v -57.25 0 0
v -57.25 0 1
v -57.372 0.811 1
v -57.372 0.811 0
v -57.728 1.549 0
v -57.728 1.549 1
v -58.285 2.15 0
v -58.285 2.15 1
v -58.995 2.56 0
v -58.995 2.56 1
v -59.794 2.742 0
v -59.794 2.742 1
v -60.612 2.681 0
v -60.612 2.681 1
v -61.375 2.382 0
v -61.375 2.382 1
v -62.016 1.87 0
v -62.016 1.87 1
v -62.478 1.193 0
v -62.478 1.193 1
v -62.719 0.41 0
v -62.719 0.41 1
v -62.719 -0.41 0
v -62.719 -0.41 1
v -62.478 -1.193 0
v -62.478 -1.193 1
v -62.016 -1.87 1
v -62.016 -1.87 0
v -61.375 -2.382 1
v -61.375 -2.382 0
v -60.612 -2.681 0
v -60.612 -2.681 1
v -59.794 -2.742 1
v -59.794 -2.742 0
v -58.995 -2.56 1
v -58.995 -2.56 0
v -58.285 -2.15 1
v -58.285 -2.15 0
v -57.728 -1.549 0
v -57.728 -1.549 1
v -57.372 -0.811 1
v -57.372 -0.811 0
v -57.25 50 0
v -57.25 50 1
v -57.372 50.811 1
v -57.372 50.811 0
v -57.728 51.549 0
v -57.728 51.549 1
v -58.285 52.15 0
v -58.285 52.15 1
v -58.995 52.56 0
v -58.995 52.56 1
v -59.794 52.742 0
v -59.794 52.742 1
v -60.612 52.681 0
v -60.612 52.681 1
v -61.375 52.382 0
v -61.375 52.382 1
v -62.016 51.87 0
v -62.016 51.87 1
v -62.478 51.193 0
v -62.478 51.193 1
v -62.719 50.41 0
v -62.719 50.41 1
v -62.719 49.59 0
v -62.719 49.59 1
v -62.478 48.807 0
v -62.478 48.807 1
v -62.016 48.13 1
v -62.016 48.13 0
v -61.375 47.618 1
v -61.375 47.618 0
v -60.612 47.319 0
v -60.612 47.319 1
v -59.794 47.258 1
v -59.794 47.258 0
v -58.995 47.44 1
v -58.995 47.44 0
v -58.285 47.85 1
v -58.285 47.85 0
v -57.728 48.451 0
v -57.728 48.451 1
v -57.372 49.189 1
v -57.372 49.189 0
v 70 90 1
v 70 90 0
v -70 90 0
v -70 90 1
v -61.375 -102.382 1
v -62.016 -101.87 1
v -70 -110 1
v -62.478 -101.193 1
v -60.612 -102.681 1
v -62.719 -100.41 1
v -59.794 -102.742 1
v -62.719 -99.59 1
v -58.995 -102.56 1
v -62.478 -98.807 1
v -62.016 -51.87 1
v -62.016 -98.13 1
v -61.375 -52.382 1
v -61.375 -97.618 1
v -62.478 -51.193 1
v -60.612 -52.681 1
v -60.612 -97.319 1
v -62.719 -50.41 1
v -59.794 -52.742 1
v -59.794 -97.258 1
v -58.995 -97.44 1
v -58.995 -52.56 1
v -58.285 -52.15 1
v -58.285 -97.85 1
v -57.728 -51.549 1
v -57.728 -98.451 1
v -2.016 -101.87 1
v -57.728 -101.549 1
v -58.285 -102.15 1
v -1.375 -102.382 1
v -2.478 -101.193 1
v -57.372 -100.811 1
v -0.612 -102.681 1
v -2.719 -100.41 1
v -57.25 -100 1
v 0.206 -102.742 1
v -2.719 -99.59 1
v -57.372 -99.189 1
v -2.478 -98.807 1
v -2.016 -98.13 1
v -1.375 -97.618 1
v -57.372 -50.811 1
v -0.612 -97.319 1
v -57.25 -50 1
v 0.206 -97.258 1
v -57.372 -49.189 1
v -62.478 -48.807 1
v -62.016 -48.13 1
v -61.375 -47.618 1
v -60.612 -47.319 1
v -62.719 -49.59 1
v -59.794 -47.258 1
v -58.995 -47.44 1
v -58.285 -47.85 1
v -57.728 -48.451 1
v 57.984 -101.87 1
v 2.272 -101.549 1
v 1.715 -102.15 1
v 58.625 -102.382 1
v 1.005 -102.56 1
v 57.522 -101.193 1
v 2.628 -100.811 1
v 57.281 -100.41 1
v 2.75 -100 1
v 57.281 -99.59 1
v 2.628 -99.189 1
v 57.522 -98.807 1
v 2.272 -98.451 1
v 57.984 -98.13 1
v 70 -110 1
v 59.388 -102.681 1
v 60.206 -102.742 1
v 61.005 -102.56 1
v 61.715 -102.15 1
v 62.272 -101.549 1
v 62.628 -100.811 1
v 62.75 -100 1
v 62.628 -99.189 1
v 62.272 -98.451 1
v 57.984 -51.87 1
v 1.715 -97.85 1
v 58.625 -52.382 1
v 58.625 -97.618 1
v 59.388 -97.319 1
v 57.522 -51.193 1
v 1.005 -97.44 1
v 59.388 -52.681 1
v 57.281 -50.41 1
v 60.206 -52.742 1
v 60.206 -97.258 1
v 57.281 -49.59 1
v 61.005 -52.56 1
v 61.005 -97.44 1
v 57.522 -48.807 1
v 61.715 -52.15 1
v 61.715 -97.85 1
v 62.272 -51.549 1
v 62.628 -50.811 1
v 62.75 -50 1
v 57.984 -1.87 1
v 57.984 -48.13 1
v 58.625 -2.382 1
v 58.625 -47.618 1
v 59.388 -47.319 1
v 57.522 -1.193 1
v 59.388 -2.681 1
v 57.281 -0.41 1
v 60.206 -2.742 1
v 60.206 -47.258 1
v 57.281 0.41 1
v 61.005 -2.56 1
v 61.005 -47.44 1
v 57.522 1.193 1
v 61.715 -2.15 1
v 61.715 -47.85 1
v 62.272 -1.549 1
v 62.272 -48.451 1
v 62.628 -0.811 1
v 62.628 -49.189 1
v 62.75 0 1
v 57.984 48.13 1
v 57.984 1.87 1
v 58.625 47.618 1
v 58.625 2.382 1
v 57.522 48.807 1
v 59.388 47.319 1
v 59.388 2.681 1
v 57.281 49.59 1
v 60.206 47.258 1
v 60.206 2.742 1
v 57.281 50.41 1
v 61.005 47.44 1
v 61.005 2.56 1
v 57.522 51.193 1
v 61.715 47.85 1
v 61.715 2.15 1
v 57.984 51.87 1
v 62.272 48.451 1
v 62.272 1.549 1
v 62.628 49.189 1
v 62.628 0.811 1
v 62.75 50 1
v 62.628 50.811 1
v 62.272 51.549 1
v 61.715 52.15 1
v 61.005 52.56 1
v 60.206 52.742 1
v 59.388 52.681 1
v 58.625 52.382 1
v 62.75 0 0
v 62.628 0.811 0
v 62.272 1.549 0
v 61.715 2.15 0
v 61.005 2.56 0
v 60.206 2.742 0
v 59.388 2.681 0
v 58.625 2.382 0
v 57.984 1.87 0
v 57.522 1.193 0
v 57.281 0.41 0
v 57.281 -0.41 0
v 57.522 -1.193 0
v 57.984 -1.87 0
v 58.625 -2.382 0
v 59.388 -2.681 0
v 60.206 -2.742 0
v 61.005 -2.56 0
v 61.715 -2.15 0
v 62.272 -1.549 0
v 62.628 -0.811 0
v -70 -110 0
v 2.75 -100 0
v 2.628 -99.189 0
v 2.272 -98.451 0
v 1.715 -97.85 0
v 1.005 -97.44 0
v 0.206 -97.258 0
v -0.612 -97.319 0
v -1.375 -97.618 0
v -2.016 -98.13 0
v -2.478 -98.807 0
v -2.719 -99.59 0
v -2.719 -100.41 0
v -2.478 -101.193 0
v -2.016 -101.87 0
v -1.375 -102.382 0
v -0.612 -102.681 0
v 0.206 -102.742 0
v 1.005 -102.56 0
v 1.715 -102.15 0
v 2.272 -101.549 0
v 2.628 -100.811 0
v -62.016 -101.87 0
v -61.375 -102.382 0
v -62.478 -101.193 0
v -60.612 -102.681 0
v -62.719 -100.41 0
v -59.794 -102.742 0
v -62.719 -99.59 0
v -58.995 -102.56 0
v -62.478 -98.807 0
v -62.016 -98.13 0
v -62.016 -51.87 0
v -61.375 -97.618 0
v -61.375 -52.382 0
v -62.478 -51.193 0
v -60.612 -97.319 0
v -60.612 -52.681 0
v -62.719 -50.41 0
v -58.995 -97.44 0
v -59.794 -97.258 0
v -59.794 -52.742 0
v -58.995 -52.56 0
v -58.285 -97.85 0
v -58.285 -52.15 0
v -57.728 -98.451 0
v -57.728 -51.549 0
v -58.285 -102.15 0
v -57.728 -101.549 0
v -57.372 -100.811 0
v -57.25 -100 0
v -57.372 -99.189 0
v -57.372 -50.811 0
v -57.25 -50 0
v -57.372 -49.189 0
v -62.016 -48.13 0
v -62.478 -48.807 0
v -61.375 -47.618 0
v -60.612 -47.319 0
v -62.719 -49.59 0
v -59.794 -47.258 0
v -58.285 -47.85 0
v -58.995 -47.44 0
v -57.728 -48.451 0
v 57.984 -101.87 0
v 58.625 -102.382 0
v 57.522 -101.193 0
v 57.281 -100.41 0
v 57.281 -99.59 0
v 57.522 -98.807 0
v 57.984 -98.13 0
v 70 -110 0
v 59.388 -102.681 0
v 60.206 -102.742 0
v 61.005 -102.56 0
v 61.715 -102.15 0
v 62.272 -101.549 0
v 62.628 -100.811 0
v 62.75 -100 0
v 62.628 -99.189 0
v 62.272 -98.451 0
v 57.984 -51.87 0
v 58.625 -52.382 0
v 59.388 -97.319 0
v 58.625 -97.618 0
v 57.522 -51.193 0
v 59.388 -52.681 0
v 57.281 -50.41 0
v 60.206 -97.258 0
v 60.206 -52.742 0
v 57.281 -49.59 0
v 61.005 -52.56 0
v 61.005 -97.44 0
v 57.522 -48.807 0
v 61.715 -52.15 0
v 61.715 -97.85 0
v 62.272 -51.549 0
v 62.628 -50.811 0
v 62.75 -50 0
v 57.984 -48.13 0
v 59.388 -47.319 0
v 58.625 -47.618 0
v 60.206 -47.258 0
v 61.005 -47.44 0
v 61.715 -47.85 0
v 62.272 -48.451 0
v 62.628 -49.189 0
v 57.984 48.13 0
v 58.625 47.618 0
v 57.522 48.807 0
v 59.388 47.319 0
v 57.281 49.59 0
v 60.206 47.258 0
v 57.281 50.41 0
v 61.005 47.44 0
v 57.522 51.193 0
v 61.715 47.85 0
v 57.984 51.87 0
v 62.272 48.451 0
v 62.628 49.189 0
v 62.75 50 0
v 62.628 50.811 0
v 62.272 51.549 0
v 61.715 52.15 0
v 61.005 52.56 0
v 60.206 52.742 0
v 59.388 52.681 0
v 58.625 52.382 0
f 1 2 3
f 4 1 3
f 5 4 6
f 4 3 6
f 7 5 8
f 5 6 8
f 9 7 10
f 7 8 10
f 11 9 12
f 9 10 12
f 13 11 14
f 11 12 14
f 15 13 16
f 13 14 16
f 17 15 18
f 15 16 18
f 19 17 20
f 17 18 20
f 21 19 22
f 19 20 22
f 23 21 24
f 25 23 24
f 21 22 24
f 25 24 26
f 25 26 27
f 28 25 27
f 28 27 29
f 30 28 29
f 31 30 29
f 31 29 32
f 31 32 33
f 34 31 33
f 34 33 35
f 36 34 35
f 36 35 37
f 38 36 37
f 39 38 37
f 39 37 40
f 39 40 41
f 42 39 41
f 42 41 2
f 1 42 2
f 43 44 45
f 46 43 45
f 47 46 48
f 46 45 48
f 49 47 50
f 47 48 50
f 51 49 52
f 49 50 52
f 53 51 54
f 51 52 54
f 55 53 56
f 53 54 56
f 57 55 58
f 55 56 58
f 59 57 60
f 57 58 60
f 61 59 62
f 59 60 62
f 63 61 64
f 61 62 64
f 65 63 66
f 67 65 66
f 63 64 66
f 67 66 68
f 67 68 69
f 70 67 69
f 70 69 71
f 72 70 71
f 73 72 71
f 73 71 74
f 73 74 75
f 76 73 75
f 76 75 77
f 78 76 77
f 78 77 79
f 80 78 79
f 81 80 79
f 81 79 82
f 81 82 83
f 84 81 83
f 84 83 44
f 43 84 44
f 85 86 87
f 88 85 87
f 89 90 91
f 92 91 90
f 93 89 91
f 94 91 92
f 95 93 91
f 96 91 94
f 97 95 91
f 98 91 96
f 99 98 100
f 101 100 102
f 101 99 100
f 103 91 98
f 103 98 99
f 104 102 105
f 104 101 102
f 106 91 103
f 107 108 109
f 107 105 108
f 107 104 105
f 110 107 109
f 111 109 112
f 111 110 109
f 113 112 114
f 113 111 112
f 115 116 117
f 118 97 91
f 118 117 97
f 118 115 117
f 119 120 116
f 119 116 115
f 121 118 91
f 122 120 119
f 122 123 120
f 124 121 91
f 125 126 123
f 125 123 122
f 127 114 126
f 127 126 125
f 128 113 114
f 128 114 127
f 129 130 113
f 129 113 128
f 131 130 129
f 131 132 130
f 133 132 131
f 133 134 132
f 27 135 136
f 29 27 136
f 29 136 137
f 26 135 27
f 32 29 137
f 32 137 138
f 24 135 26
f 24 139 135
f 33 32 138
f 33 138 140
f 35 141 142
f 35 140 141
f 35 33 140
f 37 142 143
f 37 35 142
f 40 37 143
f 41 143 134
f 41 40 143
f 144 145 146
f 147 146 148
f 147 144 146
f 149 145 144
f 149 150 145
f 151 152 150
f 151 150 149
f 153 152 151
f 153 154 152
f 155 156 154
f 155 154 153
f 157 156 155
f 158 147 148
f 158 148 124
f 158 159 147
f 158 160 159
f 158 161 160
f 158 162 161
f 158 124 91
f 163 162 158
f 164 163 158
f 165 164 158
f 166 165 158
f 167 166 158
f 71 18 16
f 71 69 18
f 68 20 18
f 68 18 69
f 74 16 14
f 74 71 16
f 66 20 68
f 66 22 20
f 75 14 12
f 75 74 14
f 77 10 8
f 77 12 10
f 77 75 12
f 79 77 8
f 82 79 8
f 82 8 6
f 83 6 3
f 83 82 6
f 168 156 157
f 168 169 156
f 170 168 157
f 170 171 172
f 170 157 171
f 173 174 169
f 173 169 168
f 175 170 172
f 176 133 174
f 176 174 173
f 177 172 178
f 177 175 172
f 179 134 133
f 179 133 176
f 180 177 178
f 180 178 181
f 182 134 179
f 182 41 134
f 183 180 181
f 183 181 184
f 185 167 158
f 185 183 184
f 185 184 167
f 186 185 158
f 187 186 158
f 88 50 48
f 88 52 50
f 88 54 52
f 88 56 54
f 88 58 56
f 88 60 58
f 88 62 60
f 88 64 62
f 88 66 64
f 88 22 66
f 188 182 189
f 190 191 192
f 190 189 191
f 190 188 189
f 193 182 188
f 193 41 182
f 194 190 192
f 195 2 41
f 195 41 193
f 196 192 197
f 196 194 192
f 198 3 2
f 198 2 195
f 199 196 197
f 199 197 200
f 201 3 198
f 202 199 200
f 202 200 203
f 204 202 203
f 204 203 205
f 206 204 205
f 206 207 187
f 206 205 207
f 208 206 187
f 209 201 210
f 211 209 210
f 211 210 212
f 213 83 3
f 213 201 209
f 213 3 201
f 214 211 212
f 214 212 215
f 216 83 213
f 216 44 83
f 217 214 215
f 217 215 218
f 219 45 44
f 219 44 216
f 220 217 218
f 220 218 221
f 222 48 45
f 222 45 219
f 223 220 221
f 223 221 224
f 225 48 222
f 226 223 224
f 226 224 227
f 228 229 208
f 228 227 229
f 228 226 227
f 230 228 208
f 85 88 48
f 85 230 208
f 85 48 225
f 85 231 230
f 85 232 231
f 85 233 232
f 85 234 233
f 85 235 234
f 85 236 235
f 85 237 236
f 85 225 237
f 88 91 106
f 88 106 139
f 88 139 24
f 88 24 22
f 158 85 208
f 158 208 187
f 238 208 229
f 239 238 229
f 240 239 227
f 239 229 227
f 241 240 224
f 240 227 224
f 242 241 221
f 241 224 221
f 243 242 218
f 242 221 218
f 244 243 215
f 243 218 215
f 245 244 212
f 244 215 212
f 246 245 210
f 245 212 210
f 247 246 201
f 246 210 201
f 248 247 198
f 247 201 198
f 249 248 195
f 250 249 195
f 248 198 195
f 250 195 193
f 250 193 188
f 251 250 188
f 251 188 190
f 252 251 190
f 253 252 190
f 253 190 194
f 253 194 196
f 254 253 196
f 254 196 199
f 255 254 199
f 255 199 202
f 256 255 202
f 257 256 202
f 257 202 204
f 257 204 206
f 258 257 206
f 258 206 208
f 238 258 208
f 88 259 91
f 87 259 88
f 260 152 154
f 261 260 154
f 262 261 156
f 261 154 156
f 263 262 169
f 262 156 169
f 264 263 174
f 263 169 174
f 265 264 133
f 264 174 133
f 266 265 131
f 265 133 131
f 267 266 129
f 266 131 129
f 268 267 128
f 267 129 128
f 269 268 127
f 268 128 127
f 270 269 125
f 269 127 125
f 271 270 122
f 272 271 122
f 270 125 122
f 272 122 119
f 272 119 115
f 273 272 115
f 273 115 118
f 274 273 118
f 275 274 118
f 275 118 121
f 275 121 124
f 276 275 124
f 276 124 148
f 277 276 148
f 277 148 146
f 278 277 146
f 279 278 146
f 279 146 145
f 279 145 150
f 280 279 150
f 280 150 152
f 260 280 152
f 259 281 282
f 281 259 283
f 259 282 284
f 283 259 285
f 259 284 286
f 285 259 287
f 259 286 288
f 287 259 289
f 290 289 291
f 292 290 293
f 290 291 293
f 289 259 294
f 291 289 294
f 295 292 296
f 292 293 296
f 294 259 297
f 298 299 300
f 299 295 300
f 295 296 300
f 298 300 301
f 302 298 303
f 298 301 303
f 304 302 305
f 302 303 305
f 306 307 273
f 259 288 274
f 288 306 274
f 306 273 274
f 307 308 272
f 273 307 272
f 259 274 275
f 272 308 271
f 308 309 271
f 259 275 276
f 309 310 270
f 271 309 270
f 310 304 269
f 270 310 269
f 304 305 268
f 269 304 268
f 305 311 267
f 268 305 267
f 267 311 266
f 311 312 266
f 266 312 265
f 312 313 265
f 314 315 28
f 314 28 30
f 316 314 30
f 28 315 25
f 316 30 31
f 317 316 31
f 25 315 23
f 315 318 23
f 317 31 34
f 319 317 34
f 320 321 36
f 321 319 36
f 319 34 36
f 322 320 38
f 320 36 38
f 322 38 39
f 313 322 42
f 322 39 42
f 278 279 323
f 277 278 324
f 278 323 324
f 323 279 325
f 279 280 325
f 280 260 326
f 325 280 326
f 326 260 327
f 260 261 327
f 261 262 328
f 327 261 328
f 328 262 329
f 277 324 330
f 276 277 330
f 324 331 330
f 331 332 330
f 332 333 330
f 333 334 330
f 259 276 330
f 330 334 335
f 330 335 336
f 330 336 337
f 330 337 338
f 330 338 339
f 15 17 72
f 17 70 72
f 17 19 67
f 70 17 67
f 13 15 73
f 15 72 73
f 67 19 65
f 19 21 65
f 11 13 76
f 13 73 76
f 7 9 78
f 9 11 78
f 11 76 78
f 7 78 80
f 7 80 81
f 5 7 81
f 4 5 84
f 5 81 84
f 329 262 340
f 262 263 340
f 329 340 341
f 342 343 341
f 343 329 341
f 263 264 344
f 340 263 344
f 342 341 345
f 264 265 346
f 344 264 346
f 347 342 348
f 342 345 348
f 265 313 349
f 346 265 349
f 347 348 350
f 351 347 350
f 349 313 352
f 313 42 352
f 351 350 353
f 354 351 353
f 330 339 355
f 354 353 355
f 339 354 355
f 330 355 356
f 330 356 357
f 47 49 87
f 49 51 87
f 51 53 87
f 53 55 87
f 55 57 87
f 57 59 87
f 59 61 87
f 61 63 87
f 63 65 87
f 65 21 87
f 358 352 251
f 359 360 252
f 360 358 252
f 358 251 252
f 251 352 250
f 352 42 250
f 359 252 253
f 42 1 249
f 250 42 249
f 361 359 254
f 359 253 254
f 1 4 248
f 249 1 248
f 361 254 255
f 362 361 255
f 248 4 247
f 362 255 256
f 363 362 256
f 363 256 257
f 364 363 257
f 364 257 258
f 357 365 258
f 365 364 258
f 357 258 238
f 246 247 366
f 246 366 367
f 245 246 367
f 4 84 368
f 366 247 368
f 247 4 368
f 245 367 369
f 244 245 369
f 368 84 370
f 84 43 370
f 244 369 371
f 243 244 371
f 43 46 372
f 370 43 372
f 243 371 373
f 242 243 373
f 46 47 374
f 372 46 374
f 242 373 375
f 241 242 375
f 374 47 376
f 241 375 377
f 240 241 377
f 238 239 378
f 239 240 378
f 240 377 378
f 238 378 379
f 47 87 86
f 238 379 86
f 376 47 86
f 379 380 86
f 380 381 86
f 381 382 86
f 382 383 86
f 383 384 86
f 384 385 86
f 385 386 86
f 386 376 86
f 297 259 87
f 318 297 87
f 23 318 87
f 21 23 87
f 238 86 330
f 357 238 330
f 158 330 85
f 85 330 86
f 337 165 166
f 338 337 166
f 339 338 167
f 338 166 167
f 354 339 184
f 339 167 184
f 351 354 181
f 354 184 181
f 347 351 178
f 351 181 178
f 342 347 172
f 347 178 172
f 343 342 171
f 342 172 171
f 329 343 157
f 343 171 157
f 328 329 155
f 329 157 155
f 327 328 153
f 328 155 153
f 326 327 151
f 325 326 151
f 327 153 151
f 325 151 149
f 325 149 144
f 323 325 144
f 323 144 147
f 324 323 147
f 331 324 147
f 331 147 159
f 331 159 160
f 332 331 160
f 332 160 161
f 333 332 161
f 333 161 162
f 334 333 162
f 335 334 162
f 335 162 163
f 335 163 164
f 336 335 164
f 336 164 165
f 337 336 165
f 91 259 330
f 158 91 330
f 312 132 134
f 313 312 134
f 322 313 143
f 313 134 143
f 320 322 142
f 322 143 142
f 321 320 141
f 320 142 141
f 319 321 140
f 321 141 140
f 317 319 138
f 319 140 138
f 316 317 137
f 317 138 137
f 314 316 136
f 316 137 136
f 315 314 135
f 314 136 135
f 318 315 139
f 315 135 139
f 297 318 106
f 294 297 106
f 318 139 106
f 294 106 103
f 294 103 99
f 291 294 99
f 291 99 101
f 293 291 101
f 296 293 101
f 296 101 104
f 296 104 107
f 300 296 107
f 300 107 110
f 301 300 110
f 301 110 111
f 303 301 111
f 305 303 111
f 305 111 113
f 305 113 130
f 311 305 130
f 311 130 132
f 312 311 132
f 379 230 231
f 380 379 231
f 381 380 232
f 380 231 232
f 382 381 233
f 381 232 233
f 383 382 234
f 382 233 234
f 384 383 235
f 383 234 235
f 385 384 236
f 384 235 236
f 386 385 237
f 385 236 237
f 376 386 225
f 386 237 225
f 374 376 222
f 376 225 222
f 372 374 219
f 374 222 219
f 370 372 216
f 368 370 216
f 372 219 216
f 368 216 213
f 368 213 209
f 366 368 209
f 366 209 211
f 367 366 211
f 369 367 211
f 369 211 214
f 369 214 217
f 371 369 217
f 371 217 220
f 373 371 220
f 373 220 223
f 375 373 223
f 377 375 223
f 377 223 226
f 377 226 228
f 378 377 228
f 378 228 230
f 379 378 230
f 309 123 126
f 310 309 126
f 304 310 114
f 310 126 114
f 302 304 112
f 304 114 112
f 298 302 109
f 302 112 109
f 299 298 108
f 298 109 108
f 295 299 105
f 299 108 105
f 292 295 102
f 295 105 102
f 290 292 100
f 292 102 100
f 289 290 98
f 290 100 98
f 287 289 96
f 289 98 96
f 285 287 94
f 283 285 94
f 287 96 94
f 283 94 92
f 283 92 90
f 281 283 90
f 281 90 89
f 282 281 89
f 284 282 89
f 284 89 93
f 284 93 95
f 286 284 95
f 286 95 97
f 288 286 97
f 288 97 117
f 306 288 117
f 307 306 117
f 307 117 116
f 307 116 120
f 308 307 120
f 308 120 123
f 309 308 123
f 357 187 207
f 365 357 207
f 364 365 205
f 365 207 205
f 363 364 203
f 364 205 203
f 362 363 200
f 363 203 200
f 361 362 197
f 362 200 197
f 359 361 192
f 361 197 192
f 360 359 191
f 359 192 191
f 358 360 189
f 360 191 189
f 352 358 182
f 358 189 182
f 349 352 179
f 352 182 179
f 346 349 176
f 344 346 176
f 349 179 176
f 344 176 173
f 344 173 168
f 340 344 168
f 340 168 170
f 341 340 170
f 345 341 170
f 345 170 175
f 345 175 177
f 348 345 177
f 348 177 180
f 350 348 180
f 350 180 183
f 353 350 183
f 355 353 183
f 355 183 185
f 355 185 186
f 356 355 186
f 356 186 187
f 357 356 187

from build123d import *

# Parameters (mm, degrees)
SKETCH_1_W          = 140
SKETCH_1_H          = 220
EXTRUDE_1_DEPTH     = 1
HOLE_WIZARD_M5_1_D  = 5.5
SKETCH_4_W          = 140
SKETCH_4_H          = 20
CUT_EXTRUDE_1_DEPTH = 10


with BuildPart() as part:
    # 스케치1 → 보스-돌출1 (new body)
    with BuildSketch(Plane.XY):
        Rectangle(SKETCH_1_W, SKETCH_1_H)
    extrude(amount=EXTRUDE_1_DEPTH)

    # M5 여유 구멍1 (through all)
    with Locations(Plane(origin=(0, 0, 0), x_dir=(-1, 0, 0), z_dir=(0, 0, -1))):
        with Locations((-60, 100), (0, 100), (60, 100), (60, 50), (60, -50), (60, 0), (60, -100), (-60, 50), (-60, -50), (-60, 0), (-60, -100), (0, -100)):
            Hole(HOLE_WIZARD_M5_1_D / 2)

    # 스케치4 → 컷-돌출1 (cut)
    with BuildSketch(Plane(origin=(0, 0, 0), x_dir=(-1, 0, 0), z_dir=(0, 0, -1))):
        with Locations((0, 100)):
            Rectangle(SKETCH_4_W, SKETCH_4_H)
    extrude(amount=-CUT_EXTRUDE_1_DEPTH, mode=Mode.SUBTRACT)


solid = part.part
